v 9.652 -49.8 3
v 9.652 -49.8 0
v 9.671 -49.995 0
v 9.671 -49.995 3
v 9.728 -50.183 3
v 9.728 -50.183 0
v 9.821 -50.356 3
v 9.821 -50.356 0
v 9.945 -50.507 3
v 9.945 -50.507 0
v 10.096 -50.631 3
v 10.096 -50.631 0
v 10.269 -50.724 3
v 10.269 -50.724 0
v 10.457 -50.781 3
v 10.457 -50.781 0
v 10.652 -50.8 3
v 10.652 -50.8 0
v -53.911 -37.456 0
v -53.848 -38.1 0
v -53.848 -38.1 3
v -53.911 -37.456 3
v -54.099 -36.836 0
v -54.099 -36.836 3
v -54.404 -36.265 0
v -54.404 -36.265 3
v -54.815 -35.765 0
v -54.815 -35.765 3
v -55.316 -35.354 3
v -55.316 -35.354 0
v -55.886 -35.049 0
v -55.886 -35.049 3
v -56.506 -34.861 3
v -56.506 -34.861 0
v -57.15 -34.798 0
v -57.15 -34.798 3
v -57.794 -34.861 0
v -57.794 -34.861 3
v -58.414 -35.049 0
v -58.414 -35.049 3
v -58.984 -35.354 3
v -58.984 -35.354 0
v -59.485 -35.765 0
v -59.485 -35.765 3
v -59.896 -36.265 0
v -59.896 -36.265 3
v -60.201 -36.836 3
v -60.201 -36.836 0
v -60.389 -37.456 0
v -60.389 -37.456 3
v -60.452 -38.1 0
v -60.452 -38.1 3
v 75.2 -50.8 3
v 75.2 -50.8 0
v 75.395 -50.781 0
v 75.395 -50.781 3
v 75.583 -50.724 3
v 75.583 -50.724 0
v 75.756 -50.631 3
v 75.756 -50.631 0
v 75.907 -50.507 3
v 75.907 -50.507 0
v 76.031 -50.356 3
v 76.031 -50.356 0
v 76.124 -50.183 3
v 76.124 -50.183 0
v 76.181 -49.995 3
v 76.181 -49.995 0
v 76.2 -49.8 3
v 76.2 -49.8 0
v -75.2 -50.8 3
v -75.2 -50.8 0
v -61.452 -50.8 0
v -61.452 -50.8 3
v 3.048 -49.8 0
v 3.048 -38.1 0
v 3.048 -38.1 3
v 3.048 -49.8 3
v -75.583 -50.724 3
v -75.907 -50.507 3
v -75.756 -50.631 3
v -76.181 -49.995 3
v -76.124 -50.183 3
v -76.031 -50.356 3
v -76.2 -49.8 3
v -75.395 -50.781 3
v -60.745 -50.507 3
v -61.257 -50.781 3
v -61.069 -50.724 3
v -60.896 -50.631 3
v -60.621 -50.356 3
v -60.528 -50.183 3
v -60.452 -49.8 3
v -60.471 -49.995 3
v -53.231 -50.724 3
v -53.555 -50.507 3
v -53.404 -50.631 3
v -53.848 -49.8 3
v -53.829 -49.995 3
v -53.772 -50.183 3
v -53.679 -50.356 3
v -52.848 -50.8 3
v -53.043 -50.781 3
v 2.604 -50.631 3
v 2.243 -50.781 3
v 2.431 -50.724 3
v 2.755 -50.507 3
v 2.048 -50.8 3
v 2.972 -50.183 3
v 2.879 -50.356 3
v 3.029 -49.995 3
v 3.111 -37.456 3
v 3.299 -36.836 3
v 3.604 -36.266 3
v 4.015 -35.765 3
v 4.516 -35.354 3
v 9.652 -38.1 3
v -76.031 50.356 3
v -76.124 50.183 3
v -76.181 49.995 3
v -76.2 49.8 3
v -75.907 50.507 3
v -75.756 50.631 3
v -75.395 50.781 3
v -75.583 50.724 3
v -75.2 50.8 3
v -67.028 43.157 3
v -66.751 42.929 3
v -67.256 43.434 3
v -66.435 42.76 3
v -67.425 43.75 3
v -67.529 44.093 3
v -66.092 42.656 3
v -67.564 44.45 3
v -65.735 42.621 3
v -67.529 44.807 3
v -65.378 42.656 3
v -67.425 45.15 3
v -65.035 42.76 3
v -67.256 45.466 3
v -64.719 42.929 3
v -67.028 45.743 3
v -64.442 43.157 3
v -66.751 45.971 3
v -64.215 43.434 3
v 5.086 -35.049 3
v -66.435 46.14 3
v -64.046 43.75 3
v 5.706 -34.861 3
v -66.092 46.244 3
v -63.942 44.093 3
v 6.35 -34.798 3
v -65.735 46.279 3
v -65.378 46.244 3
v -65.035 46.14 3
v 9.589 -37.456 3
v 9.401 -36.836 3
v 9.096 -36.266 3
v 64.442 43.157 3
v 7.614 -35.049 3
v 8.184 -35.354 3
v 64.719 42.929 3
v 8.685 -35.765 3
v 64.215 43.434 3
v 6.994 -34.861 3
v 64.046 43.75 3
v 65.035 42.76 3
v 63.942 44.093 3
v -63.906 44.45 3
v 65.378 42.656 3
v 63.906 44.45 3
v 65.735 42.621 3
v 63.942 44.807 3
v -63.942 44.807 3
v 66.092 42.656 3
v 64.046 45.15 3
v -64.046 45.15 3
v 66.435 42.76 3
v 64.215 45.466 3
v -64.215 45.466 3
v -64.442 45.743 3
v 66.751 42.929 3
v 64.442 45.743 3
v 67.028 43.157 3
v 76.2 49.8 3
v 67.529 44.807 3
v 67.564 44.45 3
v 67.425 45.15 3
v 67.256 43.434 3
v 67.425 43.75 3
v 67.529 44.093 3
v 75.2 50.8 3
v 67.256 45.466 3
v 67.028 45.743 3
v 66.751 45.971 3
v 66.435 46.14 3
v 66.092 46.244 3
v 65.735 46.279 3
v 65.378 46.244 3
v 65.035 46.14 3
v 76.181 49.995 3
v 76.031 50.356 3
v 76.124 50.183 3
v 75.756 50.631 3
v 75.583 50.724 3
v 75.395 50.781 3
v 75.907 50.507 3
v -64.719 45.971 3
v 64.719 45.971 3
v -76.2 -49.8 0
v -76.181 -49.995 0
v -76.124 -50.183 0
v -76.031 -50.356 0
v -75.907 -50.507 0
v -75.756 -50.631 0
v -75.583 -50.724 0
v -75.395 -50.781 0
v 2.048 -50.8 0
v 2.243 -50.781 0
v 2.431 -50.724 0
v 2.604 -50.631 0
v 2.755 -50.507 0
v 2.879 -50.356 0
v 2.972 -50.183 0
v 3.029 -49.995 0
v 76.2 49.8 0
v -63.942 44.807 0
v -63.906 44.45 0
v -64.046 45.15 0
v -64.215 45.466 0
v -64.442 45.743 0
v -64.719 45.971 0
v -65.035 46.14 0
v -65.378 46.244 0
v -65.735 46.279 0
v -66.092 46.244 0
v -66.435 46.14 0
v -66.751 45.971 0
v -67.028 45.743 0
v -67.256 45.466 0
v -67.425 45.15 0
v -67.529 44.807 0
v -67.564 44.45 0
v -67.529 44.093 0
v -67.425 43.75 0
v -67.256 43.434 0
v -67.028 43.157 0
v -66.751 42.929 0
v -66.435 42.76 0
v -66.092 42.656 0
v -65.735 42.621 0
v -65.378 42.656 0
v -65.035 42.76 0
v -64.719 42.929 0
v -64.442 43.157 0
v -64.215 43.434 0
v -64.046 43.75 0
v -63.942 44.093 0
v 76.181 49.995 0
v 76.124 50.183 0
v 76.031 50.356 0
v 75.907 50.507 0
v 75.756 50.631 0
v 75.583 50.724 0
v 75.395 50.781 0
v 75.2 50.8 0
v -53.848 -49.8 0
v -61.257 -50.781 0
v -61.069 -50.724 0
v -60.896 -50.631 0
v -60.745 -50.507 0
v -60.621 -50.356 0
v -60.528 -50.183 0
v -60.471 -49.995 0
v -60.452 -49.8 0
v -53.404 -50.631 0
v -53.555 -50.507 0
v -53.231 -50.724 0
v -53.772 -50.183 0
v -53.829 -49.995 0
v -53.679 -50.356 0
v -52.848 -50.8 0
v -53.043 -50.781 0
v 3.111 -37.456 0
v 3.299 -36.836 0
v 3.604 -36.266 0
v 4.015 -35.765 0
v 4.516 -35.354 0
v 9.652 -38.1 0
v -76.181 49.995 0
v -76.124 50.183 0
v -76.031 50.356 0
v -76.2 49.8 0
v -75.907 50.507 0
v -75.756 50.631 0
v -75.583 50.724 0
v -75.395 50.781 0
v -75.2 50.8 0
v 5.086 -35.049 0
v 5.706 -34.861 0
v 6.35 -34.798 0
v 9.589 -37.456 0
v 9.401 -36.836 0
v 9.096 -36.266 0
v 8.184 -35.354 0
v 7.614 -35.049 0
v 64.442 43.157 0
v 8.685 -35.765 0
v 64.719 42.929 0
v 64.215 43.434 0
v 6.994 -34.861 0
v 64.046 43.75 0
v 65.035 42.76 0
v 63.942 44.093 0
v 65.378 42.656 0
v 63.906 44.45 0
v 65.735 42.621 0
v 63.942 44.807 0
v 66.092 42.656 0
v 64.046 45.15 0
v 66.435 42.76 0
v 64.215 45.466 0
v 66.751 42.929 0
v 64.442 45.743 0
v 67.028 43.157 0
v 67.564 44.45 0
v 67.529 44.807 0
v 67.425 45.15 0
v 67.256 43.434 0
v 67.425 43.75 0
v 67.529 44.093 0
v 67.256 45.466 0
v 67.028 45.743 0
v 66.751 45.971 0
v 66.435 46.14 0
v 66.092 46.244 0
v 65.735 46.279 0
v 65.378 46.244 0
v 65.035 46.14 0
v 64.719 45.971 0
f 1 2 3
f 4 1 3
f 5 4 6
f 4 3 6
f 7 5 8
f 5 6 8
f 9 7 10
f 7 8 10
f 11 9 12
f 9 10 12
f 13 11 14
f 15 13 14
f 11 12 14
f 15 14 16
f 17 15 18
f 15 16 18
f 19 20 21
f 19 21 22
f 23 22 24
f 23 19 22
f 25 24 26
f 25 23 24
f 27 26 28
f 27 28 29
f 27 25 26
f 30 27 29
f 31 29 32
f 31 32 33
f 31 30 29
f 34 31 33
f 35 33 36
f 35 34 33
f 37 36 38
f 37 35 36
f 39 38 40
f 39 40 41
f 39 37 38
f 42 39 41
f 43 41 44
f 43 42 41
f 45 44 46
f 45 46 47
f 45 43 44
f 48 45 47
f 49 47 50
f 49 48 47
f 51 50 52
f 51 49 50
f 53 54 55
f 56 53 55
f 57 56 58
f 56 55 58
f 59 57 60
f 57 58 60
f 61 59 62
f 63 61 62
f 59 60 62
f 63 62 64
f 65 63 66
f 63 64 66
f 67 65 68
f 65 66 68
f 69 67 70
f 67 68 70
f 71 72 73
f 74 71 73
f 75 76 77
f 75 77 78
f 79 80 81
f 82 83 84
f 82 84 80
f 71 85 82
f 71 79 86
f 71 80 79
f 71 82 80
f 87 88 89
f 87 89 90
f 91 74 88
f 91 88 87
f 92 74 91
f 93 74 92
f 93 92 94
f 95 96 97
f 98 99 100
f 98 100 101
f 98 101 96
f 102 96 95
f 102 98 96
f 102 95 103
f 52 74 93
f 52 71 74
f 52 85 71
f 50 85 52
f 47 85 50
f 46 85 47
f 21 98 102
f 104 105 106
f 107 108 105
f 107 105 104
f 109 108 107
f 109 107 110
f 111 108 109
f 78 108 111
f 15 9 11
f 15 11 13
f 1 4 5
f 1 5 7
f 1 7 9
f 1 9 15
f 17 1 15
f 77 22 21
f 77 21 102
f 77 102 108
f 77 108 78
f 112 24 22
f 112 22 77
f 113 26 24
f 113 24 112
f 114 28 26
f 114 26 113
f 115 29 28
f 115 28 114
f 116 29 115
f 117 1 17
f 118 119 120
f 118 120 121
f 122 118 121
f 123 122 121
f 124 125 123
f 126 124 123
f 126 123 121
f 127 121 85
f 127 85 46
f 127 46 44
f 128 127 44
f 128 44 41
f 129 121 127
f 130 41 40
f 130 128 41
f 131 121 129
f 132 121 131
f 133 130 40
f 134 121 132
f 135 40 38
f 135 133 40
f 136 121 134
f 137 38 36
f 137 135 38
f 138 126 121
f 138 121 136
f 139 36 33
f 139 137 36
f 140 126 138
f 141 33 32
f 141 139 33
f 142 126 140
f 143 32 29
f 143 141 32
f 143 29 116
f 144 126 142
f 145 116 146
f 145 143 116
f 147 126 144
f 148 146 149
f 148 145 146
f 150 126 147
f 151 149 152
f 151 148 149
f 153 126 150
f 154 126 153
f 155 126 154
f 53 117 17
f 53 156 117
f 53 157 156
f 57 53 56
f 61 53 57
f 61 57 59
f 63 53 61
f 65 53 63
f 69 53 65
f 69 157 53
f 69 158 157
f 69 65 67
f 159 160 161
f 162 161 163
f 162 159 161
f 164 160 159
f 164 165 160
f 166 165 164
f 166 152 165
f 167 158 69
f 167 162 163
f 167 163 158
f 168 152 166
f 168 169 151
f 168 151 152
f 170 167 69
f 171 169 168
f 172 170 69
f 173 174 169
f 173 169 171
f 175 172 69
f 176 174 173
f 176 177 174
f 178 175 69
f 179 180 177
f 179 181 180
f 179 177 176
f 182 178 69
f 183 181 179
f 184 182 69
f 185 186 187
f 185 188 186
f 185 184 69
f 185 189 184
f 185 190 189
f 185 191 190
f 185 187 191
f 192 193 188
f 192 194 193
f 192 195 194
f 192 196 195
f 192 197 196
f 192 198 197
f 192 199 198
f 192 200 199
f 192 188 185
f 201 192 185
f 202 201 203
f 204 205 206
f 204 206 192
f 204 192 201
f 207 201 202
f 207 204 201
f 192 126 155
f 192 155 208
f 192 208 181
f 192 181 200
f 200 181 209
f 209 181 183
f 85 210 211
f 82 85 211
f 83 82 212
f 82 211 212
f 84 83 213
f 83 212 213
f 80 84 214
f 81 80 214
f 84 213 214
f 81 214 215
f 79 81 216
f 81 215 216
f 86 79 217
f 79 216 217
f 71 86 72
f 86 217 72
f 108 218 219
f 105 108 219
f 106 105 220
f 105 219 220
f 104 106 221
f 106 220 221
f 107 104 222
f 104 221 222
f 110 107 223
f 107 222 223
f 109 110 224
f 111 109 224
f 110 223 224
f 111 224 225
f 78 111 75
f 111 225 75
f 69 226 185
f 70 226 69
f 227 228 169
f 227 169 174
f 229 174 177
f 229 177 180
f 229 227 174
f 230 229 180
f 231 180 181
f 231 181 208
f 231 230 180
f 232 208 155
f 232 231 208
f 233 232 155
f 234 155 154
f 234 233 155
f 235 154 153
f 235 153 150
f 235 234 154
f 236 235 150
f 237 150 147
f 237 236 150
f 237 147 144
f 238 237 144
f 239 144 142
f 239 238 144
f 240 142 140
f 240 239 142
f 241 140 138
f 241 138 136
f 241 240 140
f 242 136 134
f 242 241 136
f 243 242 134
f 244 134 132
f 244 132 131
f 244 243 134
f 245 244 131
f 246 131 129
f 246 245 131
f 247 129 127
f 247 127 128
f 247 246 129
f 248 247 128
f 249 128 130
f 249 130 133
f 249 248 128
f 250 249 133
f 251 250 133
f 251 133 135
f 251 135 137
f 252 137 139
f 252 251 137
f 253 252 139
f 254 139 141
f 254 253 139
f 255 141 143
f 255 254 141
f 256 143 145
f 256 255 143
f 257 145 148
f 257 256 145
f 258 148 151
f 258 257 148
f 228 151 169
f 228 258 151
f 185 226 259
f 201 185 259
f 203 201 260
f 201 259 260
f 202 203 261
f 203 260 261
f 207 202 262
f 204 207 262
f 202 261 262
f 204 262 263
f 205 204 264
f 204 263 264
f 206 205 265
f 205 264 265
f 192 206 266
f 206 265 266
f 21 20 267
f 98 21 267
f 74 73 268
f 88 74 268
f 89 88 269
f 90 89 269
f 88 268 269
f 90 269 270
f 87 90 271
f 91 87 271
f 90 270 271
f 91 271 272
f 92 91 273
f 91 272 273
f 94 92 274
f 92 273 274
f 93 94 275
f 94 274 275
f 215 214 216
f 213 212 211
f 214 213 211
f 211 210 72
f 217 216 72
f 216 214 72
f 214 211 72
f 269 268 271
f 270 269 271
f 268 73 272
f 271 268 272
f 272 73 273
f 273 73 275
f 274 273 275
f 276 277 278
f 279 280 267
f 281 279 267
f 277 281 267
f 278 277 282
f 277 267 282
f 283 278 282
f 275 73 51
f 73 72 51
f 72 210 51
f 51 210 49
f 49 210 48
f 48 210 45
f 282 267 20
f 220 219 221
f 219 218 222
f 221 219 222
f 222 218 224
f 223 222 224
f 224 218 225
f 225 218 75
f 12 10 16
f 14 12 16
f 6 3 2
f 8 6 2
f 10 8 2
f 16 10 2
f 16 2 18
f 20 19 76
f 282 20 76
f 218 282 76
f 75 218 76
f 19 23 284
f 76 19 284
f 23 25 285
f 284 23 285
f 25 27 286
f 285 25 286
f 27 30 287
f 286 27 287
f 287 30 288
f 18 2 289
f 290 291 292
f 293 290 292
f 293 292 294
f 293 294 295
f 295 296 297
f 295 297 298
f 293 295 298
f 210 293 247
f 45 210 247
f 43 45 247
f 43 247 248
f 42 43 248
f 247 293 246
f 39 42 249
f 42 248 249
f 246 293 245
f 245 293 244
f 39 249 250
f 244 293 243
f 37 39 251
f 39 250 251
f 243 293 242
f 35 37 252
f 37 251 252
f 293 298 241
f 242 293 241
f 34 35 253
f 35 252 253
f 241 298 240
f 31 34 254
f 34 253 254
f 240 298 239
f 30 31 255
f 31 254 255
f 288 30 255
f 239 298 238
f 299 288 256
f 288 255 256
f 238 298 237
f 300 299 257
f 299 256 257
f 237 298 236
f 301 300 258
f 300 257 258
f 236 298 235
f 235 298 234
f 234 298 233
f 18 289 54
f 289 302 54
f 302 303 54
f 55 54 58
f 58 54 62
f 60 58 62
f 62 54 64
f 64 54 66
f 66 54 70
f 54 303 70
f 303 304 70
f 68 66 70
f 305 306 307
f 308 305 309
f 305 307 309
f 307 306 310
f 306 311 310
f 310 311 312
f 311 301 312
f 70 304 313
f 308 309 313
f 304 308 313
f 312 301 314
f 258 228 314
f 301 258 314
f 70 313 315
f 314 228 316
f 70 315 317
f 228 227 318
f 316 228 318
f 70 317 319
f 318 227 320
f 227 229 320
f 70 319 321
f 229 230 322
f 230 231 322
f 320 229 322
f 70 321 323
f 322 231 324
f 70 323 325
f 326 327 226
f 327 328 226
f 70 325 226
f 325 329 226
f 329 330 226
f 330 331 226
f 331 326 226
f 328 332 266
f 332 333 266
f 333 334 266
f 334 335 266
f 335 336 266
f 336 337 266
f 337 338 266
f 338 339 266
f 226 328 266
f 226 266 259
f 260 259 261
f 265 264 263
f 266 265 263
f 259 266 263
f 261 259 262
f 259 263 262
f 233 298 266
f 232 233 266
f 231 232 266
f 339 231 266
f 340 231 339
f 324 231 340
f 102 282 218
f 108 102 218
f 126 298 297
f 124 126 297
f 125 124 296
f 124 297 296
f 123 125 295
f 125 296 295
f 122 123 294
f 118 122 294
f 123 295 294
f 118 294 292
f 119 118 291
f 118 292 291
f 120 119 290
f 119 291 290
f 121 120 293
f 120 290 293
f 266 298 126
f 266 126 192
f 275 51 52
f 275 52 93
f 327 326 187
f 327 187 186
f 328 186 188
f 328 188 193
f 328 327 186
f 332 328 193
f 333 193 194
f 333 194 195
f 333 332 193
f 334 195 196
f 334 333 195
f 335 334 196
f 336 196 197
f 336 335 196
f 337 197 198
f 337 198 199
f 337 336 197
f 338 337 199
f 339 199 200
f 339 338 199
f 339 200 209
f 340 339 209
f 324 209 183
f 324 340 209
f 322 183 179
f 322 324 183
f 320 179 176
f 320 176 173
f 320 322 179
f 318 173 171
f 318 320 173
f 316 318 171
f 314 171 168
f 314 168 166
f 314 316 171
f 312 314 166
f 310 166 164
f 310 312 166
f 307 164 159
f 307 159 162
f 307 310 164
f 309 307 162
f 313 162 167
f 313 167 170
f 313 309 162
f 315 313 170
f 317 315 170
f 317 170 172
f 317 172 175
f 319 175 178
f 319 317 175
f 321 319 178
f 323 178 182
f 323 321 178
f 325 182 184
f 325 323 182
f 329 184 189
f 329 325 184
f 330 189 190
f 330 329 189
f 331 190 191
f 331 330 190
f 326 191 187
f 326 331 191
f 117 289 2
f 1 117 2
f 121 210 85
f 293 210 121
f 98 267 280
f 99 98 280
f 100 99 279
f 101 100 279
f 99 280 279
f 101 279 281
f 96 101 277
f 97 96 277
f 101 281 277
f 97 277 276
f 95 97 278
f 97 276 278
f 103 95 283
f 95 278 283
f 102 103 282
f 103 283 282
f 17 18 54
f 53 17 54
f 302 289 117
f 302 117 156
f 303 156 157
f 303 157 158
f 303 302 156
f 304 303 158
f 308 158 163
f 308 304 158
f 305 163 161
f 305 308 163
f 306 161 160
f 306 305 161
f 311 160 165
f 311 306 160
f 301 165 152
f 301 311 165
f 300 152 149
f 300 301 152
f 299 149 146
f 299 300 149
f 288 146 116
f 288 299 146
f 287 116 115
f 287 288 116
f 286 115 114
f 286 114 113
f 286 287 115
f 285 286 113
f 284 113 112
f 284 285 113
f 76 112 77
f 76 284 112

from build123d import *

# Parameters (mm, degrees)
SKETCH_R  = 1.8288
PAD_DEPTH = 3


with BuildPart() as part:
    # Sketch → Pad (new body)
    with BuildSketch(Plane.XY):
        with BuildLine():
            ThreePointArc((-75.2, 50.8), (-75.907107, 50.507107), (-76.2, 49.8))
            Line((-76.2, -49.8), (-76.2, 49.8))
            ThreePointArc((-76.2, -49.8), (-75.907107, -50.507107), (-75.2, -50.8))
            Line((-75.2, -50.8), (-61.452, -50.8))
            ThreePointArc((-61.452, -50.8), (-60.744893, -50.507107), (-60.452, -49.8))
            Line((-60.452, -38.1), (-60.452, -49.8))
            ThreePointArc((-53.848, -38.1), (-57.15, -34.797985), (-60.452, -38.1))
            Line((-53.848, -38.1), (-53.848, -49.8))
            ThreePointArc((-53.848, -49.8), (-53.555107, -50.507107), (-52.848, -50.8))
            Line((-52.848, -50.8), (2.048, -50.8))
            ThreePointArc((2.048, -50.8), (2.755107, -50.507107), (3.048, -49.8))
            Line((3.048, -38.1), (3.048, -49.8))
            ThreePointArc((9.652, -38.1), (6.35, -34.797989), (3.048, -38.1))
            Line((9.652, -38.1), (9.652, -49.8))
            ThreePointArc((9.652, -49.8), (9.944893, -50.507107), (10.652, -50.8))
            Line((10.652, -50.8), (75.2, -50.8))
            ThreePointArc((75.2, -50.8), (75.907107, -50.507107), (76.2, -49.8))
            Line((76.2, 49.8), (76.2, -49.8))
            ThreePointArc((76.2, 49.8), (75.907107, 50.507107), (75.2, 50.8))
            Line((-75.2, 50.8), (75.2, 50.8))
        make_face()
        with Locations((-65.7352, 44.45)):
            Circle(SKETCH_R, mode=Mode.SUBTRACT)
        with Locations((65.7352, 44.45)):
            Circle(SKETCH_R, mode=Mode.SUBTRACT)
    extrude(amount=PAD_DEPTH)


solid = part.part
